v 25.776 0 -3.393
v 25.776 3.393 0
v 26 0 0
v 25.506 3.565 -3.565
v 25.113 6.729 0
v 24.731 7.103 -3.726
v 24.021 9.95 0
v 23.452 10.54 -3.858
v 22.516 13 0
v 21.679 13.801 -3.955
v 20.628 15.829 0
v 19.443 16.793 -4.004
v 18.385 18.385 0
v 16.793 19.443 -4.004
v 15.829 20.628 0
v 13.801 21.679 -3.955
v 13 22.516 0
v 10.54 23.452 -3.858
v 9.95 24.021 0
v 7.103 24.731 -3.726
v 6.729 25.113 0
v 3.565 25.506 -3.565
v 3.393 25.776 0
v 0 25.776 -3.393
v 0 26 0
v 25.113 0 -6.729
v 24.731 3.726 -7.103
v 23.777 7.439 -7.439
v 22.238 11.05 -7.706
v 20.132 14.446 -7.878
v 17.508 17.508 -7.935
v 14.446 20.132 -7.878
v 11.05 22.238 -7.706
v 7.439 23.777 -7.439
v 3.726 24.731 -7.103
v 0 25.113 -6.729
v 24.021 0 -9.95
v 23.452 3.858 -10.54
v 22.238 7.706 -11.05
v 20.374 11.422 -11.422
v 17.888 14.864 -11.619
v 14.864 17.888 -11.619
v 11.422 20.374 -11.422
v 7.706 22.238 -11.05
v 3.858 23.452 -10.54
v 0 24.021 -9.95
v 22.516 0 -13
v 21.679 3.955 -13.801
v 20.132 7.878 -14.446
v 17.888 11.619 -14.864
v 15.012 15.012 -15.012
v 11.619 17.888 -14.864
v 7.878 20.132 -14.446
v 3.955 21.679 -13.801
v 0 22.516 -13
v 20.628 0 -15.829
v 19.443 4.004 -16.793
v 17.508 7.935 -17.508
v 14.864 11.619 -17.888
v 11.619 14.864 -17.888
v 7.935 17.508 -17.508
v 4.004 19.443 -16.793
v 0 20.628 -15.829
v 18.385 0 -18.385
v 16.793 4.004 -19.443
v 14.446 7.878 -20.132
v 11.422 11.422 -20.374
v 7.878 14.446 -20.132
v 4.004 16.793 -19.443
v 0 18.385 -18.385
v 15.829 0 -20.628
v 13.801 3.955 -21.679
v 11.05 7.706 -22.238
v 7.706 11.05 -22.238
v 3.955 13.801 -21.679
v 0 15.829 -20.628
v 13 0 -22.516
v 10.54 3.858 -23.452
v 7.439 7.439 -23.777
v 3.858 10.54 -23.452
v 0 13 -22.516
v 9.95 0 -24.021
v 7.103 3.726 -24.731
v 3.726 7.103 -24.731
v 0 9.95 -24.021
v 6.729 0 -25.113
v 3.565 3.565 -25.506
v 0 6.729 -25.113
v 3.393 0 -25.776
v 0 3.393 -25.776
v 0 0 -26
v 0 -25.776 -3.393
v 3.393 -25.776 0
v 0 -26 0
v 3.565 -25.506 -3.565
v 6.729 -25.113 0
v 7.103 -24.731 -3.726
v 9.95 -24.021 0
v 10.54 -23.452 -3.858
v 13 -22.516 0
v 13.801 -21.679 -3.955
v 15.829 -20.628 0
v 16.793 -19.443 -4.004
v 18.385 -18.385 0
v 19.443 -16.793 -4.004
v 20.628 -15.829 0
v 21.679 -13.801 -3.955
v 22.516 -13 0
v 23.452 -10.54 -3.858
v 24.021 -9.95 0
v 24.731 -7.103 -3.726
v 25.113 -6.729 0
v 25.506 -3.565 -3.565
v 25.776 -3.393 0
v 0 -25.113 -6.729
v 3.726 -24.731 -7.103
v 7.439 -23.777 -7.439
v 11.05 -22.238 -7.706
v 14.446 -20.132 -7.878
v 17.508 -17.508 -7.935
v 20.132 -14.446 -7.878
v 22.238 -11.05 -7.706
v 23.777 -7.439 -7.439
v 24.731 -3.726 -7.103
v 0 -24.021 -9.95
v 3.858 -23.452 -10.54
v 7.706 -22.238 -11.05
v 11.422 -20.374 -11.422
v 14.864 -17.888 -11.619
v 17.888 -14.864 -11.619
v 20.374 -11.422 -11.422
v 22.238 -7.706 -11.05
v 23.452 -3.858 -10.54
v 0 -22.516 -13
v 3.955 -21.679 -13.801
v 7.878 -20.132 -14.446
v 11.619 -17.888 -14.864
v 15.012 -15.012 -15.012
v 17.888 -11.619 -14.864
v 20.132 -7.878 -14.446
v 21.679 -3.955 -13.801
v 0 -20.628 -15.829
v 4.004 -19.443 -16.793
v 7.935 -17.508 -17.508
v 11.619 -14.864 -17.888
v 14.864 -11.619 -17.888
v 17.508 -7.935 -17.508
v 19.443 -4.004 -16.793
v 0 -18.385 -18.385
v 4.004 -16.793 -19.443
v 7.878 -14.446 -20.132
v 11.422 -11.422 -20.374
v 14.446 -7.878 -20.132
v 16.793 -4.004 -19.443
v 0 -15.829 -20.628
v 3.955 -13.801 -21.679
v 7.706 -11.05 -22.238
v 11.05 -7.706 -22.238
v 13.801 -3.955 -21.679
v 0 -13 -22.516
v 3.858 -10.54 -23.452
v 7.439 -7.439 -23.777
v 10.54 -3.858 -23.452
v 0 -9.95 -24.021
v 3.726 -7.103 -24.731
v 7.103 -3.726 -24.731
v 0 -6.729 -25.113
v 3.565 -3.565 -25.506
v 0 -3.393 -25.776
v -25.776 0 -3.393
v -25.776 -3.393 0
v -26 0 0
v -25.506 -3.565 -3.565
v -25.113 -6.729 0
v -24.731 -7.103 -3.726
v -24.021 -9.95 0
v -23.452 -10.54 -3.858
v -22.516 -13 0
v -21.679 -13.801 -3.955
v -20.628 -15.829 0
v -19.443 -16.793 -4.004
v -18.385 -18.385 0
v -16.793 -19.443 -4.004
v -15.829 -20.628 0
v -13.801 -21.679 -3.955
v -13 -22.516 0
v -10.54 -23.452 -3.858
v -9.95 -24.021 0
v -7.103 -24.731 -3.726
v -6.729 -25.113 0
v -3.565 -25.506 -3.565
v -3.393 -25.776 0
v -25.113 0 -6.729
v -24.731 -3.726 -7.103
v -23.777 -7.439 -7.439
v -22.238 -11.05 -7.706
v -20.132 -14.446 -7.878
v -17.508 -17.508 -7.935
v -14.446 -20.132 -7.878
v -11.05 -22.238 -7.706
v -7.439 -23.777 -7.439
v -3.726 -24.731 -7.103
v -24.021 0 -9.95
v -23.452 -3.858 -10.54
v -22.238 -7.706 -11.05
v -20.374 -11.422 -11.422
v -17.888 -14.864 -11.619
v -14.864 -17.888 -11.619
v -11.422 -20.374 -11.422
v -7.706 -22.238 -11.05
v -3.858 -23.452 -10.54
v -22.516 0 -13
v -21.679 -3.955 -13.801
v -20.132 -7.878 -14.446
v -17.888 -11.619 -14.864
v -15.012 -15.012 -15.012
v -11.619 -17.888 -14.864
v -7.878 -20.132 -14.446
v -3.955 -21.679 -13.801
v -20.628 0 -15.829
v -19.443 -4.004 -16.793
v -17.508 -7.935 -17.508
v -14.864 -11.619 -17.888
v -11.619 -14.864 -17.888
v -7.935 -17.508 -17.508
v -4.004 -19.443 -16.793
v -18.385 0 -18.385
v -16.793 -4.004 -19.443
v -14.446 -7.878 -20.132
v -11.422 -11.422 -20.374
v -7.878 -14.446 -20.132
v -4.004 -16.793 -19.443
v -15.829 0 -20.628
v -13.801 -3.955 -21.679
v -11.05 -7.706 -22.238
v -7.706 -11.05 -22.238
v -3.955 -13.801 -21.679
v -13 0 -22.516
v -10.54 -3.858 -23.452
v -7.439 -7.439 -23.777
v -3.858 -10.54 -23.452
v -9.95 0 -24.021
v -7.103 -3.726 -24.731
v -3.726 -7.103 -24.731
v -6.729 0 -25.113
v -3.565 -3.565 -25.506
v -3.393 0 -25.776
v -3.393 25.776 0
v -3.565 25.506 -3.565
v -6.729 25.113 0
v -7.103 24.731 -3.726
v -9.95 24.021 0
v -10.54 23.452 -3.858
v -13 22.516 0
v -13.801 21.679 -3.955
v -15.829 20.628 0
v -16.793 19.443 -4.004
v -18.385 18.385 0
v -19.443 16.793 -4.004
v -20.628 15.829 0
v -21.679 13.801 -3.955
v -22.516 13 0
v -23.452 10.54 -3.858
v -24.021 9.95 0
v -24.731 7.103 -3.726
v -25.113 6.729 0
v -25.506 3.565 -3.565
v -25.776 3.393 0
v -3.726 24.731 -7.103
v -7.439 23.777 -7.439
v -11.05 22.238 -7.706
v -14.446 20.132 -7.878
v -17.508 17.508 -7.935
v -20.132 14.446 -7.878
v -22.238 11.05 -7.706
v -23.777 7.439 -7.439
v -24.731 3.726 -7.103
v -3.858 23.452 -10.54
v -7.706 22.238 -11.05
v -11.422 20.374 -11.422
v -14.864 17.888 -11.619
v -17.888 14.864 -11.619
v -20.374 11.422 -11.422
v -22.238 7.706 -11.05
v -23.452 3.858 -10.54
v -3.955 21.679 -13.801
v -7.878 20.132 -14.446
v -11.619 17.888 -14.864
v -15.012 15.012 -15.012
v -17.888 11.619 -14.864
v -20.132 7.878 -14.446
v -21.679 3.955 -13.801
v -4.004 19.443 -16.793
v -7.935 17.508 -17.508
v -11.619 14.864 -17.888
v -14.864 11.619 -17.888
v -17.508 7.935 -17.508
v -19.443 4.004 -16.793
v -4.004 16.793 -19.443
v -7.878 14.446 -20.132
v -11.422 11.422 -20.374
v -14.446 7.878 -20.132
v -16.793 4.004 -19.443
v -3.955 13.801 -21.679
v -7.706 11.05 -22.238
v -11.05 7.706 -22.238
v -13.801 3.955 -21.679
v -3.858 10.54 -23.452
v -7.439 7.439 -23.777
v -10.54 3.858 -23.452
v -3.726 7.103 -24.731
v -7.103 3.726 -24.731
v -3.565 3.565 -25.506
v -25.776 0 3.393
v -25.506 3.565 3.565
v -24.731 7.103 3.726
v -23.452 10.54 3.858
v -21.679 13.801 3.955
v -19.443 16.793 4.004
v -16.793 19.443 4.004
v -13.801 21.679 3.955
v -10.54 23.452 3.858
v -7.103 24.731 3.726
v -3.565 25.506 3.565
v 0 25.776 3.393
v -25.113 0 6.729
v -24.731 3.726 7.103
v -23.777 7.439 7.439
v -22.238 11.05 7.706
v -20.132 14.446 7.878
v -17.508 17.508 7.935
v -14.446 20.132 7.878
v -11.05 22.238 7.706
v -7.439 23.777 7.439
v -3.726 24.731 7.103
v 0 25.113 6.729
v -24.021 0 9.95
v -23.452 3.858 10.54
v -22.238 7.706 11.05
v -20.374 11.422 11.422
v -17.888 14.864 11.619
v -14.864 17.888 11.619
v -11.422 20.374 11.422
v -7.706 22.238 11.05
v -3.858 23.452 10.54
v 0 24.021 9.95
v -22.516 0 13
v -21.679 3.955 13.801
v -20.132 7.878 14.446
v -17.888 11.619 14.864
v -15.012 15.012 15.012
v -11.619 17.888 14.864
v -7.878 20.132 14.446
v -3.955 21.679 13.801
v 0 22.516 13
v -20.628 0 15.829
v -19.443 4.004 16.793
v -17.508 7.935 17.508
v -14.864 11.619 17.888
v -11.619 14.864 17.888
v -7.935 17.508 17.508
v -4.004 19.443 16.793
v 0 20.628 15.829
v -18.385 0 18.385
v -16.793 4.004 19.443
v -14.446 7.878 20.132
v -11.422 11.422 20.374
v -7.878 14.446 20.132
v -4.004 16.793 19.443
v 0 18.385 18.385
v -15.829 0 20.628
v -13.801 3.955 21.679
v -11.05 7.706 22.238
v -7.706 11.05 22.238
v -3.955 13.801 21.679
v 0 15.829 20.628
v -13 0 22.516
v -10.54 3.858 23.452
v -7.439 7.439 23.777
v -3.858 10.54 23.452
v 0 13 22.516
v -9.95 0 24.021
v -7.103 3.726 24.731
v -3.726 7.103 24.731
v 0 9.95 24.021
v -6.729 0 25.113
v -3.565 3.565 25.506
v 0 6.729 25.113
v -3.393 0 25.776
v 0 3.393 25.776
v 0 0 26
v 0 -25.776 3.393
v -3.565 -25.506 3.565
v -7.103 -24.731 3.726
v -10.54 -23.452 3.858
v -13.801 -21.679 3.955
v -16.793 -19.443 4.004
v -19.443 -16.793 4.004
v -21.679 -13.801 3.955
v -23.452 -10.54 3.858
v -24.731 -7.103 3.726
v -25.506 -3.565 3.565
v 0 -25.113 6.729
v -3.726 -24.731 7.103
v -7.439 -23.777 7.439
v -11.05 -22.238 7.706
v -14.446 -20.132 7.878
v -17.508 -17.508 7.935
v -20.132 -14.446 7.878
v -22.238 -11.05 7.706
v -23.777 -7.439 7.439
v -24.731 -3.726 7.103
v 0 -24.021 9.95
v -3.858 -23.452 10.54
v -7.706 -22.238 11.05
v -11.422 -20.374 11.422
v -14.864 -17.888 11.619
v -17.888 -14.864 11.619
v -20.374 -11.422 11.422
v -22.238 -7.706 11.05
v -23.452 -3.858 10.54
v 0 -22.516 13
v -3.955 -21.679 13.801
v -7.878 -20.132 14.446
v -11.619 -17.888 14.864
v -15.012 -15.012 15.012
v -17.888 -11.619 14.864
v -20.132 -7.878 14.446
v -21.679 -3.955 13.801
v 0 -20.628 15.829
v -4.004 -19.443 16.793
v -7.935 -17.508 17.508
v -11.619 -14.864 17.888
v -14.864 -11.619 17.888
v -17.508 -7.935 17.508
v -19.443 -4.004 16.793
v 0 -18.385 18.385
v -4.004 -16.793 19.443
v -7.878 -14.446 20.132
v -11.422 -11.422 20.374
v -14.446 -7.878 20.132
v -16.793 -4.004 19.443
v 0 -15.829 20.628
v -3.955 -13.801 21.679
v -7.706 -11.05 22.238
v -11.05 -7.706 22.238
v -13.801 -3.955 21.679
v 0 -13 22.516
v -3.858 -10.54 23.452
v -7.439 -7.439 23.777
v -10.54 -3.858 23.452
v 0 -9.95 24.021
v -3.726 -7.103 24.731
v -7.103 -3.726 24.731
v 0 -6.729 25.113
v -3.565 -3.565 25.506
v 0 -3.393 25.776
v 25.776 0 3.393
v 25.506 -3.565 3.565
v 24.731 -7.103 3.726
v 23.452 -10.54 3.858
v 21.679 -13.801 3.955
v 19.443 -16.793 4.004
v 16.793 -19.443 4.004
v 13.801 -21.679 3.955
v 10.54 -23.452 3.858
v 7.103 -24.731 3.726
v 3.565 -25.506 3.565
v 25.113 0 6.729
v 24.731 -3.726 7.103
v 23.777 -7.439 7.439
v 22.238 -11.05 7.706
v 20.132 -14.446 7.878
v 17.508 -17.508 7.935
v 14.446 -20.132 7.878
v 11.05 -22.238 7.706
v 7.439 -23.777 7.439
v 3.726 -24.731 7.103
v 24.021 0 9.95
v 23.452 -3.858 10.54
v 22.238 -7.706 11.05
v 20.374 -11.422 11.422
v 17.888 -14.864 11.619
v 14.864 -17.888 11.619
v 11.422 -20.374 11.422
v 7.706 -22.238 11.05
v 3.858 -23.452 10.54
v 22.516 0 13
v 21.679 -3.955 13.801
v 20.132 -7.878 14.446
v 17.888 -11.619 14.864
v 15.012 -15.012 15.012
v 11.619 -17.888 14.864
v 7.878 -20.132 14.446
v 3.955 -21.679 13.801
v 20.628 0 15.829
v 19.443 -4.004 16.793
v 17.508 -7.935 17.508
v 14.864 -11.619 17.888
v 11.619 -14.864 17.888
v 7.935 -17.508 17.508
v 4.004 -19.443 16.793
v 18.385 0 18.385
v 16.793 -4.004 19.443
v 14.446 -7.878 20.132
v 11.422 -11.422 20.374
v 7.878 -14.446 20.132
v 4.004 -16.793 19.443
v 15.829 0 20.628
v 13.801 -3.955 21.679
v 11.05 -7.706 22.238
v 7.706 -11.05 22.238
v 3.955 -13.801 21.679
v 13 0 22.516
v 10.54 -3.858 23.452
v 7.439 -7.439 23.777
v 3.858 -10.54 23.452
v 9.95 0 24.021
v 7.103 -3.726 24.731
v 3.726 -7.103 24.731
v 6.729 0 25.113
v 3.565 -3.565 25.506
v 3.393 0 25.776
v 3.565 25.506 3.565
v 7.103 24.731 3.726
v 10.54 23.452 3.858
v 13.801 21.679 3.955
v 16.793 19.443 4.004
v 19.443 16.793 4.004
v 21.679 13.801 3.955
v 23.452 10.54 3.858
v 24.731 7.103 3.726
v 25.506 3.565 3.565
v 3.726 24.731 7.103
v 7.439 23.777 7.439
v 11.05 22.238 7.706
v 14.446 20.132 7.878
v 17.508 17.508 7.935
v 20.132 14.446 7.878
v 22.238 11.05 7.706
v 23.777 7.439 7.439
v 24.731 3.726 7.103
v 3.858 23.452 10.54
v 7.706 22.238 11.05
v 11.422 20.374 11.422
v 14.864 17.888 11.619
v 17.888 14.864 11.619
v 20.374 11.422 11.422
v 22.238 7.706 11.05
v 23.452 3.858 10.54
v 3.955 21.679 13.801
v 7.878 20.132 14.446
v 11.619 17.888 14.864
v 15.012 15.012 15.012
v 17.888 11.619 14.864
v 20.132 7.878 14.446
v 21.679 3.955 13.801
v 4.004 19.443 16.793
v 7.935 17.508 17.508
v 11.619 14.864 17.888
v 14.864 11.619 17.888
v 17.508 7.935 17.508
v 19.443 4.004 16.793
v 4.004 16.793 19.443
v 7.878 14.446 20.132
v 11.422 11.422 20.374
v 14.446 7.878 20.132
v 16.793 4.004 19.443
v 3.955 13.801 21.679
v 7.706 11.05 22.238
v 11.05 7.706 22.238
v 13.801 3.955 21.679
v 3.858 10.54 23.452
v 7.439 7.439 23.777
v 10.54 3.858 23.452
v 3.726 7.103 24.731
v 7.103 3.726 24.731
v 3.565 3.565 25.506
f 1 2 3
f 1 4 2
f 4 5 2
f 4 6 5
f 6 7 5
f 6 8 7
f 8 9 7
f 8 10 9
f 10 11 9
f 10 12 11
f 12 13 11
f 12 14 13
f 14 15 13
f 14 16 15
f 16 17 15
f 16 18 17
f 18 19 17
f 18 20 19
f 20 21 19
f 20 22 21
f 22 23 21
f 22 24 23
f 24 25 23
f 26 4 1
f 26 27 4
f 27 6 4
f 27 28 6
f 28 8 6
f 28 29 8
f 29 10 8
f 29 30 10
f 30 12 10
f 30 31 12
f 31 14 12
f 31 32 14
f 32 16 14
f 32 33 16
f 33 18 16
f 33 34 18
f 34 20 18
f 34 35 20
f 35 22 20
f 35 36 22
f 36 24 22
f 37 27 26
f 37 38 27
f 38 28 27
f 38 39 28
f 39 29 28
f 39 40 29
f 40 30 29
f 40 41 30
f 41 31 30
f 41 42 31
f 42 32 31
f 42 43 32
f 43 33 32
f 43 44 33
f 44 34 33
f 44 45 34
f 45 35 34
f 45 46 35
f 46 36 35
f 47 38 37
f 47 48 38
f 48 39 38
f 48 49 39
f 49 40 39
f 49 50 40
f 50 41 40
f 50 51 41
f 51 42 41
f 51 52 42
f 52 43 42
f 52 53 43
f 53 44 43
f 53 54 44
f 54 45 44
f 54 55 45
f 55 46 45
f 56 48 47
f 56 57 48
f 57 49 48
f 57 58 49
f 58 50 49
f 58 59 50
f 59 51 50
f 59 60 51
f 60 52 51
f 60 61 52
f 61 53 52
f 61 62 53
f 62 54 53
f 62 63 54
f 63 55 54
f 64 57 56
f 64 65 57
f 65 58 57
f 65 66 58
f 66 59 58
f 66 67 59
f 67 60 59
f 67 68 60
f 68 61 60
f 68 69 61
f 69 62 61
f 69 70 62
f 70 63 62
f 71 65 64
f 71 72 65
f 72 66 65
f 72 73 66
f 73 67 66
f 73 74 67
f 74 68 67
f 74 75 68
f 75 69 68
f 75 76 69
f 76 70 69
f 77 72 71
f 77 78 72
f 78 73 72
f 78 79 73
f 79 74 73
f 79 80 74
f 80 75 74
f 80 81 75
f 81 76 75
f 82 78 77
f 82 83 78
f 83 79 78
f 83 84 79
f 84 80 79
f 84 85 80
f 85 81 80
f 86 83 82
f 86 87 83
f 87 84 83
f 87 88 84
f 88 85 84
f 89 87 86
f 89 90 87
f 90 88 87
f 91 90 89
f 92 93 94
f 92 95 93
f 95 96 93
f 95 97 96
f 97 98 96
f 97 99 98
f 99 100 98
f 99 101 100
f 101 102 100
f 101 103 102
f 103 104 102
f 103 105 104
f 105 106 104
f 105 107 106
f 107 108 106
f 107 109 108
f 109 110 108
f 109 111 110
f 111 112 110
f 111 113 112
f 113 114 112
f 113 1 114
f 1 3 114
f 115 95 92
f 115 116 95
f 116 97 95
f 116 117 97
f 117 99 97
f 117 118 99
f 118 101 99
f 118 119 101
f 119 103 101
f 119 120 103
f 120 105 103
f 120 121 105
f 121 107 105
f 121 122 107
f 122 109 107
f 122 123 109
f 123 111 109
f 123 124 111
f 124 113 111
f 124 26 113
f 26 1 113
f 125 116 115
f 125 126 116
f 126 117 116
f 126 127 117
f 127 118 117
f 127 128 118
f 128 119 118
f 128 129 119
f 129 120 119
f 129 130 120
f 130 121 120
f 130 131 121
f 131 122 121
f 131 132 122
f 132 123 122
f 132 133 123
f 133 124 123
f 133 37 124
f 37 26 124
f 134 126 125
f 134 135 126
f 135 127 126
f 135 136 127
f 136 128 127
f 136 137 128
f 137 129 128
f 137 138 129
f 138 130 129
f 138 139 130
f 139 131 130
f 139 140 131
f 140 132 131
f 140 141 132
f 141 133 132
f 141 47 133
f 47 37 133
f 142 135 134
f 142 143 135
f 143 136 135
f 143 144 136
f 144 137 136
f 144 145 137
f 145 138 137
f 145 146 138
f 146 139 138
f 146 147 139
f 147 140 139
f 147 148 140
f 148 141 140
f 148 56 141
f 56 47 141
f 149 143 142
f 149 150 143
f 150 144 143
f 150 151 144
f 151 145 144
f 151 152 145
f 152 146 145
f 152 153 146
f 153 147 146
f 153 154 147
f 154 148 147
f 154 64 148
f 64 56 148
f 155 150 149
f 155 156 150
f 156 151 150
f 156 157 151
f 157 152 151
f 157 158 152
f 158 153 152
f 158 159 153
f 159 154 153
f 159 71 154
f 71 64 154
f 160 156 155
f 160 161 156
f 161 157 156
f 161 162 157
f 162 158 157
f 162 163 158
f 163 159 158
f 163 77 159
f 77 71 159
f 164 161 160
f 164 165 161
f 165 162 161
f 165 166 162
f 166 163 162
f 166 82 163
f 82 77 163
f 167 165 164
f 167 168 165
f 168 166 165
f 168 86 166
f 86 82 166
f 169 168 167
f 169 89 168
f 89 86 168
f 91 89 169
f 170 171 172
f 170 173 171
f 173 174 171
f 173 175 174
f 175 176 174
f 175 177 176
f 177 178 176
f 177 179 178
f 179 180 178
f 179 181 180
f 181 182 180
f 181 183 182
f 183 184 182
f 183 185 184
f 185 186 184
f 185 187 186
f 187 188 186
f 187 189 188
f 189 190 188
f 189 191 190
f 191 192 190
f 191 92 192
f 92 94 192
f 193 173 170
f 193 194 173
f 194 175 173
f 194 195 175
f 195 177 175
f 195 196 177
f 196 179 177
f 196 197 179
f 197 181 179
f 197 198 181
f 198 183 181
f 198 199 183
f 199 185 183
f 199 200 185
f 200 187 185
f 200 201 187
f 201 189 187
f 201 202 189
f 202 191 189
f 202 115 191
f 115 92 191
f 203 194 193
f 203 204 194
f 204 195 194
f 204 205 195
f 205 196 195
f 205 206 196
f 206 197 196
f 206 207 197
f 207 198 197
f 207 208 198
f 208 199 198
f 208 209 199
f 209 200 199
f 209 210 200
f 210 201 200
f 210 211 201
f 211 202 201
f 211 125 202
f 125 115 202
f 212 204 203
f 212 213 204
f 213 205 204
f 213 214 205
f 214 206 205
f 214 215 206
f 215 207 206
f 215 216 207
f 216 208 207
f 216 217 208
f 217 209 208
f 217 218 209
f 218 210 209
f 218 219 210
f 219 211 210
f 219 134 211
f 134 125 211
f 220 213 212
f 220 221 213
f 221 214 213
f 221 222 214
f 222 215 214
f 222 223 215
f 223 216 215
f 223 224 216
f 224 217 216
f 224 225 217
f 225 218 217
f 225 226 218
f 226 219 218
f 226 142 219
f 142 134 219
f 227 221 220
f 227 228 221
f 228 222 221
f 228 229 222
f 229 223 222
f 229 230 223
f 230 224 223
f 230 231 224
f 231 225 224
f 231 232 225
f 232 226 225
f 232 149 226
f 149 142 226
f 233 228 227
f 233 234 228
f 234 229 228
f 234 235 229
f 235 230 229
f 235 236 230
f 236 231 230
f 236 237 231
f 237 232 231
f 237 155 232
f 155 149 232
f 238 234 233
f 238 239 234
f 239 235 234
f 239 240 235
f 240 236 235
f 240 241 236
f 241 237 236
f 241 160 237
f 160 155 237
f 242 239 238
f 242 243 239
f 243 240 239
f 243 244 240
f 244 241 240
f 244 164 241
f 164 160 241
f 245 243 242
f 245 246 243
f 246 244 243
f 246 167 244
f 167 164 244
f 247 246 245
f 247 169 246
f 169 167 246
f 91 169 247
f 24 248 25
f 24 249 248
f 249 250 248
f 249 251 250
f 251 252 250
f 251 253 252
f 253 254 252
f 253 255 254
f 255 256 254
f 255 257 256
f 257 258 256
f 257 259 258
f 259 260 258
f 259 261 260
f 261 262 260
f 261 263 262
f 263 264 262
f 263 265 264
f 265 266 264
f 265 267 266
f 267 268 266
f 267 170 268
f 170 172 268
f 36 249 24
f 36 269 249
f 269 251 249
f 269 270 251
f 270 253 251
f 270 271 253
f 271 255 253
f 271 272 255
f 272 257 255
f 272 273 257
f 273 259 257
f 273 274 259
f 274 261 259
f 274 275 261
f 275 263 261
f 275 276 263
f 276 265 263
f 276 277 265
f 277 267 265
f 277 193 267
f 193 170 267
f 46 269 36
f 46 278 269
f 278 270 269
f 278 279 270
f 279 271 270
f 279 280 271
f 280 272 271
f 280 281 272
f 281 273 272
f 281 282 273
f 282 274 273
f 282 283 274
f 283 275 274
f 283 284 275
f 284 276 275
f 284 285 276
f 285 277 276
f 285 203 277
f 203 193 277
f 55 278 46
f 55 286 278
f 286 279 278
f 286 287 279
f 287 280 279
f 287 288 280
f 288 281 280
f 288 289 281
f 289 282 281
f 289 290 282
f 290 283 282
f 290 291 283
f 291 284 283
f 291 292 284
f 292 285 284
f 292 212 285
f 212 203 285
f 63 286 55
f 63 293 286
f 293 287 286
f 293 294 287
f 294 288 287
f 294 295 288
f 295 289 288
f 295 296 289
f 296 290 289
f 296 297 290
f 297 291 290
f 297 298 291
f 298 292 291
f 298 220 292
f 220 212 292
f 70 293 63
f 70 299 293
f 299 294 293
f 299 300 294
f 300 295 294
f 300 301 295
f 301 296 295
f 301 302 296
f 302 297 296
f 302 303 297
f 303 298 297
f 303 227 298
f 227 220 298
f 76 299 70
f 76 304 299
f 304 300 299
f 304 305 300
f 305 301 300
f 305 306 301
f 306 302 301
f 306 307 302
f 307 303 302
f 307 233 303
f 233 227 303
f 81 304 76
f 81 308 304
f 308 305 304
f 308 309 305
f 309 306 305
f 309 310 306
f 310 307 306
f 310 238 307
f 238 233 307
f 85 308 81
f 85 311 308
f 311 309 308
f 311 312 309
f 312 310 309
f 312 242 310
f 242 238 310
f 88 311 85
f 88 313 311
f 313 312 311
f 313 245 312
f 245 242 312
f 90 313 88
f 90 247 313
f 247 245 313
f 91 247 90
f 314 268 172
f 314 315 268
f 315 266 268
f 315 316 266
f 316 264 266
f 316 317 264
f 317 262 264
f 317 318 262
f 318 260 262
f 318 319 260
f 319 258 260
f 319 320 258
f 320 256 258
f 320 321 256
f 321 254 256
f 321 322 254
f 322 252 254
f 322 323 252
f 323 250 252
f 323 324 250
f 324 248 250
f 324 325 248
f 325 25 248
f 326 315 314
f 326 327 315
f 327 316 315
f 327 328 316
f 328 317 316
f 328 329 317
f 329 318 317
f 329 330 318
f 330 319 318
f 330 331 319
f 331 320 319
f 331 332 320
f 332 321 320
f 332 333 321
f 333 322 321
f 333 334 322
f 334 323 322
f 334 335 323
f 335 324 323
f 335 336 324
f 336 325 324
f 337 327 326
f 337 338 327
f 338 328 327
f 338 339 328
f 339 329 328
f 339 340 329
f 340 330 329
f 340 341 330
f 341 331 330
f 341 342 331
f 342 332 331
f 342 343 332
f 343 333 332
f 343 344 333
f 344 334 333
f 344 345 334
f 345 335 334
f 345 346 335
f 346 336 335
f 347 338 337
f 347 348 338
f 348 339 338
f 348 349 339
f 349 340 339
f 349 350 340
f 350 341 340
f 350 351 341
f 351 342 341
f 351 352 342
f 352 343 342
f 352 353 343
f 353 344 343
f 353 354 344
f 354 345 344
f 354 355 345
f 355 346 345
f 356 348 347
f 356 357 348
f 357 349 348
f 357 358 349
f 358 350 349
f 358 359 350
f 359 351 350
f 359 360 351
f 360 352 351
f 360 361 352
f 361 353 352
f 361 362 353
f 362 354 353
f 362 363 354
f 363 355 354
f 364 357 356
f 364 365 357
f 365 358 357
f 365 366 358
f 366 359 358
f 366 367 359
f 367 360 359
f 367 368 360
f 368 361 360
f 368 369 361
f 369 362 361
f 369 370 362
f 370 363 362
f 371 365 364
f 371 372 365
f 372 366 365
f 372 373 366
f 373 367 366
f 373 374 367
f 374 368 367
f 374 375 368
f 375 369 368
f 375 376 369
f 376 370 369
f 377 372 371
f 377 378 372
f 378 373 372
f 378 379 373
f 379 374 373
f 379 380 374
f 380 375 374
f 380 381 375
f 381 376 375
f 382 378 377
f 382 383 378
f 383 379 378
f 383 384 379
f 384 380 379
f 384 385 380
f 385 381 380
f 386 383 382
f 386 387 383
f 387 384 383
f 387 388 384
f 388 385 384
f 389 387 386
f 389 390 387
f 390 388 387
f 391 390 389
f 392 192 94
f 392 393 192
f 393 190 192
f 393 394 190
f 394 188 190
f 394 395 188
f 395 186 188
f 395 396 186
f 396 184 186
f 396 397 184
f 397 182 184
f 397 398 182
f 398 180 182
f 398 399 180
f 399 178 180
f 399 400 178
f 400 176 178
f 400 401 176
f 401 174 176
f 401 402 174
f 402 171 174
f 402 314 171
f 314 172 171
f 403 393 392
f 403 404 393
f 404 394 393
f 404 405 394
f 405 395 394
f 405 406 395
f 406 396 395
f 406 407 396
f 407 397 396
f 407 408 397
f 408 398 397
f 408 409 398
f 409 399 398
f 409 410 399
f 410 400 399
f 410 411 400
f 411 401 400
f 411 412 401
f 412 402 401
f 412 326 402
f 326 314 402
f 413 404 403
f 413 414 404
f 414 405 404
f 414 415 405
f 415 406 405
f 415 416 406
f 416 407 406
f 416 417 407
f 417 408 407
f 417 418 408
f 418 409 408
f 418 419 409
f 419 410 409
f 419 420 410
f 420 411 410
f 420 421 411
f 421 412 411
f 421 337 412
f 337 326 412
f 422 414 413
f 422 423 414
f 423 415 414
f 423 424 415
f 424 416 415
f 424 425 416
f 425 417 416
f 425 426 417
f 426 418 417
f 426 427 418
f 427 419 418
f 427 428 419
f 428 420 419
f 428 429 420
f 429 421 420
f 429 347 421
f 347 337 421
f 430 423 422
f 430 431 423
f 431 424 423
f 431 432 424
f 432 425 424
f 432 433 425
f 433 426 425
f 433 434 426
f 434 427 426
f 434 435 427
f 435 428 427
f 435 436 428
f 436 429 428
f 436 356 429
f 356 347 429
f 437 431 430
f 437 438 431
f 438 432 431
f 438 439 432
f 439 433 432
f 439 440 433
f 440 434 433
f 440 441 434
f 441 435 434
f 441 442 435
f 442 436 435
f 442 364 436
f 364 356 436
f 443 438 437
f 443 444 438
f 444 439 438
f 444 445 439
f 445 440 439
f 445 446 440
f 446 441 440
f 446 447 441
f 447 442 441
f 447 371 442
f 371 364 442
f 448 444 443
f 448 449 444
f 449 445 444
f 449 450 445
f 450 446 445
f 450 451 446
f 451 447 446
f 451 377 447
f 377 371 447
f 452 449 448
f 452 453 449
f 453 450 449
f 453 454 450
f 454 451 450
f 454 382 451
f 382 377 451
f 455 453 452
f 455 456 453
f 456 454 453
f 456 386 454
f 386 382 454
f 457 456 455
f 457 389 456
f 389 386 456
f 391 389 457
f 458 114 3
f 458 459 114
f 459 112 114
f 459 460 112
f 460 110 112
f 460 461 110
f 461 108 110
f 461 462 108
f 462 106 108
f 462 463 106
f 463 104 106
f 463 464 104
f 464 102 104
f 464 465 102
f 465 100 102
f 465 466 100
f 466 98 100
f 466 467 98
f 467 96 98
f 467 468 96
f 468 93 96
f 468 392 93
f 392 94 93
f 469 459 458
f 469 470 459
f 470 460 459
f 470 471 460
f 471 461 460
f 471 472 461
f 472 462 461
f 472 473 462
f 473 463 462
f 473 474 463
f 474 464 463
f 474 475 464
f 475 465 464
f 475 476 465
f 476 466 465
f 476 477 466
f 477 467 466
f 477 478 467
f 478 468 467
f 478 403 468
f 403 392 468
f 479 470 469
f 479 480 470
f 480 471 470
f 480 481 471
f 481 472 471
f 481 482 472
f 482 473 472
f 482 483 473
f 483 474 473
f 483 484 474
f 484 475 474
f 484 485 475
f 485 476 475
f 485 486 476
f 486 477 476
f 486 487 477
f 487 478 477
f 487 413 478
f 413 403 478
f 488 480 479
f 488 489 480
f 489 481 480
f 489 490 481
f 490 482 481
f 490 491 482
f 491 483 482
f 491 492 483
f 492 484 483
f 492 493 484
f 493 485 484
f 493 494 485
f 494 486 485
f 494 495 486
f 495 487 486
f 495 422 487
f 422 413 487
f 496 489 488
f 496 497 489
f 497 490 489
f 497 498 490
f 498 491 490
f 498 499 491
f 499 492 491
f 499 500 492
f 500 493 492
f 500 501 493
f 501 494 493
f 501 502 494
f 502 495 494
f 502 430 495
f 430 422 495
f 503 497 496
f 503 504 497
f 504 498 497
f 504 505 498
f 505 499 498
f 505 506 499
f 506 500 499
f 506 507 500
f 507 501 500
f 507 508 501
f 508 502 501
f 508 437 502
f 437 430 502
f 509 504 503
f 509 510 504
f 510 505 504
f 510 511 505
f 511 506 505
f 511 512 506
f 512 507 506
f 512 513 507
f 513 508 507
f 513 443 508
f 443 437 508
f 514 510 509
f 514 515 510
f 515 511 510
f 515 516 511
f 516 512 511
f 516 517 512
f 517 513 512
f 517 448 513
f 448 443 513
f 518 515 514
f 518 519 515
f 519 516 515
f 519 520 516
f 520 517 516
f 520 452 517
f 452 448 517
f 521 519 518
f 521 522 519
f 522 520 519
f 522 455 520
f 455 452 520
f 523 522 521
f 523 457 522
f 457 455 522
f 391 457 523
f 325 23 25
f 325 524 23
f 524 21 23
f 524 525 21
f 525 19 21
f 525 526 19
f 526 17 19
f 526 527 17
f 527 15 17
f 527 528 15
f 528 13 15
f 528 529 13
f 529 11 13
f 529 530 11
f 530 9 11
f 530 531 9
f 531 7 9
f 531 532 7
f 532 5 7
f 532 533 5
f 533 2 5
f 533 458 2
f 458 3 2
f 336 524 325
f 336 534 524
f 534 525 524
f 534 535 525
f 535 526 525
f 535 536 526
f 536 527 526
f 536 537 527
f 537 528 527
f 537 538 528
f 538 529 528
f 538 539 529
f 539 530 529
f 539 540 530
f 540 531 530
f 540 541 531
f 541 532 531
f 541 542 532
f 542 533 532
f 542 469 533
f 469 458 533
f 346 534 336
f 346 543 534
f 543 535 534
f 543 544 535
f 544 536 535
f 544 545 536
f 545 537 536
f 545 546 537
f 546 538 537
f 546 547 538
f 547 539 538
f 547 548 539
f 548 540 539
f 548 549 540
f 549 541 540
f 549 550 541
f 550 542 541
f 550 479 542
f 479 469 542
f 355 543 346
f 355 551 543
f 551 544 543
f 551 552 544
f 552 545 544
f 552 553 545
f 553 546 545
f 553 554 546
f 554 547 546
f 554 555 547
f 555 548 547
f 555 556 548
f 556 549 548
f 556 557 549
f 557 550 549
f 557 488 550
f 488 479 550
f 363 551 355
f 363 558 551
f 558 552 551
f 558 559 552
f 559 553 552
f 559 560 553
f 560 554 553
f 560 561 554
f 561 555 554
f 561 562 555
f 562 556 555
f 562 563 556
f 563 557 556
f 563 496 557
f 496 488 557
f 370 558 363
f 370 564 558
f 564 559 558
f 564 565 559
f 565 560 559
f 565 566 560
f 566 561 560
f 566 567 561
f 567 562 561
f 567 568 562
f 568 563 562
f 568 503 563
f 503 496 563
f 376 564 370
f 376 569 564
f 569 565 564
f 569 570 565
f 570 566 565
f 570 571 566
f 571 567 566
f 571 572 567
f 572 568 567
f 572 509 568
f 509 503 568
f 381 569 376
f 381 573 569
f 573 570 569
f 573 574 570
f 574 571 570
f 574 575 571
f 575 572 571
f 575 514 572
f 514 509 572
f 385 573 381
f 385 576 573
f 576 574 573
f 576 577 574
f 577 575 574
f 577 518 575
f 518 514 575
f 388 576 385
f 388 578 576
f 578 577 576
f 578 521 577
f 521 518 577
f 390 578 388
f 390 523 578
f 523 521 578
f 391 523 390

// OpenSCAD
// file: ../p/48/8-8sphe.scad
use <../../lib.scad>
use <1-8sphe.scad>
function ldraw_lib__48__8_8sphe() = [
// 0 Hi-Res Sphere 1.0
// 0 Name: 48\8-8sphe.dat
// 0 Author: Steve Bliss [sbliss]
// 0 !LDRAW_ORG 48_Primitive UPDATE 2012-01
// 0 !LICENSE Licensed under CC BY 2.0 and CC BY 4.0 : see CAreadme.txt
// 
// 0 BFC CERTIFY CCW
  [0,"BFC","CERTIFY"],
  [0,"BFC","CCW"],
// 
// 0 !HISTORY 2012-03-30 [PTadmin] Official Update 2012-01
// 
// 
// 1 16 0 0 0 1 0 0 0 1 0 0 0 1 48\1-8sphe.dat
  [1,16,0,0,0,1,0,0,0,1,0,0,0,1, ldraw_lib__48__1_8sphe()],
// 1 16 0 0 0 0 0 1 0 1 0 -1 0 0 48\1-8sphe.dat
  [1,16,0,0,0,0,0,1,0,1,0,-1,0,0, ldraw_lib__48__1_8sphe()],
// 1 16 0 0 0 -1 0 0 0 1 0 0 0 -1 48\1-8sphe.dat
  [1,16,0,0,0,-1,0,0,0,1,0,0,0,-1, ldraw_lib__48__1_8sphe()],
// 1 16 0 0 0 0 0 -1 0 1 0 1 0 0 48\1-8sphe.dat
  [1,16,0,0,0,0,0,-1,0,1,0,1,0,0, ldraw_lib__48__1_8sphe()],
// 1 16 0 0 0 -1 0 0 0 -1 0 0 0 1 48\1-8sphe.dat
  [1,16,0,0,0,-1,0,0,0,-1,0,0,0,1, ldraw_lib__48__1_8sphe()],
// 1 16 0 0 0 0 0 -1 0 -1 0 -1 0 0 48\1-8sphe.dat
  [1,16,0,0,0,0,0,-1,0,-1,0,-1,0,0, ldraw_lib__48__1_8sphe()],
// 1 16 0 0 0 1 0 0 0 -1 0 0 0 -1 48\1-8sphe.dat
  [1,16,0,0,0,1,0,0,0,-1,0,0,0,-1, ldraw_lib__48__1_8sphe()],
// 1 16 0 0 0 0 0 1 0 -1 0 1 0 0 48\1-8sphe.dat
  [1,16,0,0,0,0,0,1,0,-1,0,1,0,0, ldraw_lib__48__1_8sphe()],
// 0
];
makepoly(ldraw_lib__48__8_8sphe(), line=0.2);
// file: 22119.scad
use <../lib.scad>
use <../p/48/8-8sphe.scad>
function ldraw_lib__22119() = [
// 0 Ball 52mm Diameter
// 0 Name: 22119.dat
// 0 Author: Philippe Hurbain [Philo]
// 0 !LDRAW_ORG Part UPDATE 2012-01
// 0 !LICENSE Licensed under CC BY 2.0 and CC BY 4.0 : see CAreadme.txt
// 
// 0 BFC CERTIFY CCW
  [0,"BFC","CERTIFY"],
  [0,"BFC","CCW"],
// 
// 0 !CATEGORY Sphere
// 
// 0 !HISTORY 2012-03-30 [PTadmin] Official Update 2012-01
// 
// 
// 1 16 0 0 0 65 0 0 0 65 0 0 0 65 48\8-8sphe.dat
  [1,16,0,0,0,65,0,0,0,65,0,0,0,65, ldraw_lib__48__8_8sphe()],
// 0
];
makepoly(ldraw_lib__22119(), line=0.2);
// main file
use <../lib.scad>
use <22119.scad>
function ldraw_lib__41250() = [
// 0 ~_Ball 52mm Diameter Red (Obsolete)
// 0 Name: 41250.dat
// 0 Author: [PTadmin]
// 0 !LDRAW_ORG Part Physical_Colour UPDATE 2019-02
// 0 !LICENSE Licensed under CC BY 2.0 and CC BY 4.0 : see CAreadme.txt
// 
// 0 BFC CERTIFY CW
  [0,"BFC","CERTIFY"],
  [0,"BFC","CW"],
// 
// 0 !CATEGORY Sphere
// 
// 0 !HISTORY 2012-03-30 [PTadmin] Official Update 2012-01
// 0 !HISTORY 2019-08-03 [Holly-Wood] Obsoleted per decision not to include physical colour parts
// 0 !HISTORY 2019-09-09 [PTadmin] Official Update 2019-02
// 
// 
// 0 // This file is a "shortcut" with the correct number for the actual
// 0 // colouring of the part (Red).
// 
// 1 4 0 0 0 1 0 0 0 1 0 0 0 1 22119.dat
  [1,4,0,0,0,1,0,0,0,1,0,0,0,1, ldraw_lib__22119()],
];
makepoly(ldraw_lib__41250(), line=0.2);
